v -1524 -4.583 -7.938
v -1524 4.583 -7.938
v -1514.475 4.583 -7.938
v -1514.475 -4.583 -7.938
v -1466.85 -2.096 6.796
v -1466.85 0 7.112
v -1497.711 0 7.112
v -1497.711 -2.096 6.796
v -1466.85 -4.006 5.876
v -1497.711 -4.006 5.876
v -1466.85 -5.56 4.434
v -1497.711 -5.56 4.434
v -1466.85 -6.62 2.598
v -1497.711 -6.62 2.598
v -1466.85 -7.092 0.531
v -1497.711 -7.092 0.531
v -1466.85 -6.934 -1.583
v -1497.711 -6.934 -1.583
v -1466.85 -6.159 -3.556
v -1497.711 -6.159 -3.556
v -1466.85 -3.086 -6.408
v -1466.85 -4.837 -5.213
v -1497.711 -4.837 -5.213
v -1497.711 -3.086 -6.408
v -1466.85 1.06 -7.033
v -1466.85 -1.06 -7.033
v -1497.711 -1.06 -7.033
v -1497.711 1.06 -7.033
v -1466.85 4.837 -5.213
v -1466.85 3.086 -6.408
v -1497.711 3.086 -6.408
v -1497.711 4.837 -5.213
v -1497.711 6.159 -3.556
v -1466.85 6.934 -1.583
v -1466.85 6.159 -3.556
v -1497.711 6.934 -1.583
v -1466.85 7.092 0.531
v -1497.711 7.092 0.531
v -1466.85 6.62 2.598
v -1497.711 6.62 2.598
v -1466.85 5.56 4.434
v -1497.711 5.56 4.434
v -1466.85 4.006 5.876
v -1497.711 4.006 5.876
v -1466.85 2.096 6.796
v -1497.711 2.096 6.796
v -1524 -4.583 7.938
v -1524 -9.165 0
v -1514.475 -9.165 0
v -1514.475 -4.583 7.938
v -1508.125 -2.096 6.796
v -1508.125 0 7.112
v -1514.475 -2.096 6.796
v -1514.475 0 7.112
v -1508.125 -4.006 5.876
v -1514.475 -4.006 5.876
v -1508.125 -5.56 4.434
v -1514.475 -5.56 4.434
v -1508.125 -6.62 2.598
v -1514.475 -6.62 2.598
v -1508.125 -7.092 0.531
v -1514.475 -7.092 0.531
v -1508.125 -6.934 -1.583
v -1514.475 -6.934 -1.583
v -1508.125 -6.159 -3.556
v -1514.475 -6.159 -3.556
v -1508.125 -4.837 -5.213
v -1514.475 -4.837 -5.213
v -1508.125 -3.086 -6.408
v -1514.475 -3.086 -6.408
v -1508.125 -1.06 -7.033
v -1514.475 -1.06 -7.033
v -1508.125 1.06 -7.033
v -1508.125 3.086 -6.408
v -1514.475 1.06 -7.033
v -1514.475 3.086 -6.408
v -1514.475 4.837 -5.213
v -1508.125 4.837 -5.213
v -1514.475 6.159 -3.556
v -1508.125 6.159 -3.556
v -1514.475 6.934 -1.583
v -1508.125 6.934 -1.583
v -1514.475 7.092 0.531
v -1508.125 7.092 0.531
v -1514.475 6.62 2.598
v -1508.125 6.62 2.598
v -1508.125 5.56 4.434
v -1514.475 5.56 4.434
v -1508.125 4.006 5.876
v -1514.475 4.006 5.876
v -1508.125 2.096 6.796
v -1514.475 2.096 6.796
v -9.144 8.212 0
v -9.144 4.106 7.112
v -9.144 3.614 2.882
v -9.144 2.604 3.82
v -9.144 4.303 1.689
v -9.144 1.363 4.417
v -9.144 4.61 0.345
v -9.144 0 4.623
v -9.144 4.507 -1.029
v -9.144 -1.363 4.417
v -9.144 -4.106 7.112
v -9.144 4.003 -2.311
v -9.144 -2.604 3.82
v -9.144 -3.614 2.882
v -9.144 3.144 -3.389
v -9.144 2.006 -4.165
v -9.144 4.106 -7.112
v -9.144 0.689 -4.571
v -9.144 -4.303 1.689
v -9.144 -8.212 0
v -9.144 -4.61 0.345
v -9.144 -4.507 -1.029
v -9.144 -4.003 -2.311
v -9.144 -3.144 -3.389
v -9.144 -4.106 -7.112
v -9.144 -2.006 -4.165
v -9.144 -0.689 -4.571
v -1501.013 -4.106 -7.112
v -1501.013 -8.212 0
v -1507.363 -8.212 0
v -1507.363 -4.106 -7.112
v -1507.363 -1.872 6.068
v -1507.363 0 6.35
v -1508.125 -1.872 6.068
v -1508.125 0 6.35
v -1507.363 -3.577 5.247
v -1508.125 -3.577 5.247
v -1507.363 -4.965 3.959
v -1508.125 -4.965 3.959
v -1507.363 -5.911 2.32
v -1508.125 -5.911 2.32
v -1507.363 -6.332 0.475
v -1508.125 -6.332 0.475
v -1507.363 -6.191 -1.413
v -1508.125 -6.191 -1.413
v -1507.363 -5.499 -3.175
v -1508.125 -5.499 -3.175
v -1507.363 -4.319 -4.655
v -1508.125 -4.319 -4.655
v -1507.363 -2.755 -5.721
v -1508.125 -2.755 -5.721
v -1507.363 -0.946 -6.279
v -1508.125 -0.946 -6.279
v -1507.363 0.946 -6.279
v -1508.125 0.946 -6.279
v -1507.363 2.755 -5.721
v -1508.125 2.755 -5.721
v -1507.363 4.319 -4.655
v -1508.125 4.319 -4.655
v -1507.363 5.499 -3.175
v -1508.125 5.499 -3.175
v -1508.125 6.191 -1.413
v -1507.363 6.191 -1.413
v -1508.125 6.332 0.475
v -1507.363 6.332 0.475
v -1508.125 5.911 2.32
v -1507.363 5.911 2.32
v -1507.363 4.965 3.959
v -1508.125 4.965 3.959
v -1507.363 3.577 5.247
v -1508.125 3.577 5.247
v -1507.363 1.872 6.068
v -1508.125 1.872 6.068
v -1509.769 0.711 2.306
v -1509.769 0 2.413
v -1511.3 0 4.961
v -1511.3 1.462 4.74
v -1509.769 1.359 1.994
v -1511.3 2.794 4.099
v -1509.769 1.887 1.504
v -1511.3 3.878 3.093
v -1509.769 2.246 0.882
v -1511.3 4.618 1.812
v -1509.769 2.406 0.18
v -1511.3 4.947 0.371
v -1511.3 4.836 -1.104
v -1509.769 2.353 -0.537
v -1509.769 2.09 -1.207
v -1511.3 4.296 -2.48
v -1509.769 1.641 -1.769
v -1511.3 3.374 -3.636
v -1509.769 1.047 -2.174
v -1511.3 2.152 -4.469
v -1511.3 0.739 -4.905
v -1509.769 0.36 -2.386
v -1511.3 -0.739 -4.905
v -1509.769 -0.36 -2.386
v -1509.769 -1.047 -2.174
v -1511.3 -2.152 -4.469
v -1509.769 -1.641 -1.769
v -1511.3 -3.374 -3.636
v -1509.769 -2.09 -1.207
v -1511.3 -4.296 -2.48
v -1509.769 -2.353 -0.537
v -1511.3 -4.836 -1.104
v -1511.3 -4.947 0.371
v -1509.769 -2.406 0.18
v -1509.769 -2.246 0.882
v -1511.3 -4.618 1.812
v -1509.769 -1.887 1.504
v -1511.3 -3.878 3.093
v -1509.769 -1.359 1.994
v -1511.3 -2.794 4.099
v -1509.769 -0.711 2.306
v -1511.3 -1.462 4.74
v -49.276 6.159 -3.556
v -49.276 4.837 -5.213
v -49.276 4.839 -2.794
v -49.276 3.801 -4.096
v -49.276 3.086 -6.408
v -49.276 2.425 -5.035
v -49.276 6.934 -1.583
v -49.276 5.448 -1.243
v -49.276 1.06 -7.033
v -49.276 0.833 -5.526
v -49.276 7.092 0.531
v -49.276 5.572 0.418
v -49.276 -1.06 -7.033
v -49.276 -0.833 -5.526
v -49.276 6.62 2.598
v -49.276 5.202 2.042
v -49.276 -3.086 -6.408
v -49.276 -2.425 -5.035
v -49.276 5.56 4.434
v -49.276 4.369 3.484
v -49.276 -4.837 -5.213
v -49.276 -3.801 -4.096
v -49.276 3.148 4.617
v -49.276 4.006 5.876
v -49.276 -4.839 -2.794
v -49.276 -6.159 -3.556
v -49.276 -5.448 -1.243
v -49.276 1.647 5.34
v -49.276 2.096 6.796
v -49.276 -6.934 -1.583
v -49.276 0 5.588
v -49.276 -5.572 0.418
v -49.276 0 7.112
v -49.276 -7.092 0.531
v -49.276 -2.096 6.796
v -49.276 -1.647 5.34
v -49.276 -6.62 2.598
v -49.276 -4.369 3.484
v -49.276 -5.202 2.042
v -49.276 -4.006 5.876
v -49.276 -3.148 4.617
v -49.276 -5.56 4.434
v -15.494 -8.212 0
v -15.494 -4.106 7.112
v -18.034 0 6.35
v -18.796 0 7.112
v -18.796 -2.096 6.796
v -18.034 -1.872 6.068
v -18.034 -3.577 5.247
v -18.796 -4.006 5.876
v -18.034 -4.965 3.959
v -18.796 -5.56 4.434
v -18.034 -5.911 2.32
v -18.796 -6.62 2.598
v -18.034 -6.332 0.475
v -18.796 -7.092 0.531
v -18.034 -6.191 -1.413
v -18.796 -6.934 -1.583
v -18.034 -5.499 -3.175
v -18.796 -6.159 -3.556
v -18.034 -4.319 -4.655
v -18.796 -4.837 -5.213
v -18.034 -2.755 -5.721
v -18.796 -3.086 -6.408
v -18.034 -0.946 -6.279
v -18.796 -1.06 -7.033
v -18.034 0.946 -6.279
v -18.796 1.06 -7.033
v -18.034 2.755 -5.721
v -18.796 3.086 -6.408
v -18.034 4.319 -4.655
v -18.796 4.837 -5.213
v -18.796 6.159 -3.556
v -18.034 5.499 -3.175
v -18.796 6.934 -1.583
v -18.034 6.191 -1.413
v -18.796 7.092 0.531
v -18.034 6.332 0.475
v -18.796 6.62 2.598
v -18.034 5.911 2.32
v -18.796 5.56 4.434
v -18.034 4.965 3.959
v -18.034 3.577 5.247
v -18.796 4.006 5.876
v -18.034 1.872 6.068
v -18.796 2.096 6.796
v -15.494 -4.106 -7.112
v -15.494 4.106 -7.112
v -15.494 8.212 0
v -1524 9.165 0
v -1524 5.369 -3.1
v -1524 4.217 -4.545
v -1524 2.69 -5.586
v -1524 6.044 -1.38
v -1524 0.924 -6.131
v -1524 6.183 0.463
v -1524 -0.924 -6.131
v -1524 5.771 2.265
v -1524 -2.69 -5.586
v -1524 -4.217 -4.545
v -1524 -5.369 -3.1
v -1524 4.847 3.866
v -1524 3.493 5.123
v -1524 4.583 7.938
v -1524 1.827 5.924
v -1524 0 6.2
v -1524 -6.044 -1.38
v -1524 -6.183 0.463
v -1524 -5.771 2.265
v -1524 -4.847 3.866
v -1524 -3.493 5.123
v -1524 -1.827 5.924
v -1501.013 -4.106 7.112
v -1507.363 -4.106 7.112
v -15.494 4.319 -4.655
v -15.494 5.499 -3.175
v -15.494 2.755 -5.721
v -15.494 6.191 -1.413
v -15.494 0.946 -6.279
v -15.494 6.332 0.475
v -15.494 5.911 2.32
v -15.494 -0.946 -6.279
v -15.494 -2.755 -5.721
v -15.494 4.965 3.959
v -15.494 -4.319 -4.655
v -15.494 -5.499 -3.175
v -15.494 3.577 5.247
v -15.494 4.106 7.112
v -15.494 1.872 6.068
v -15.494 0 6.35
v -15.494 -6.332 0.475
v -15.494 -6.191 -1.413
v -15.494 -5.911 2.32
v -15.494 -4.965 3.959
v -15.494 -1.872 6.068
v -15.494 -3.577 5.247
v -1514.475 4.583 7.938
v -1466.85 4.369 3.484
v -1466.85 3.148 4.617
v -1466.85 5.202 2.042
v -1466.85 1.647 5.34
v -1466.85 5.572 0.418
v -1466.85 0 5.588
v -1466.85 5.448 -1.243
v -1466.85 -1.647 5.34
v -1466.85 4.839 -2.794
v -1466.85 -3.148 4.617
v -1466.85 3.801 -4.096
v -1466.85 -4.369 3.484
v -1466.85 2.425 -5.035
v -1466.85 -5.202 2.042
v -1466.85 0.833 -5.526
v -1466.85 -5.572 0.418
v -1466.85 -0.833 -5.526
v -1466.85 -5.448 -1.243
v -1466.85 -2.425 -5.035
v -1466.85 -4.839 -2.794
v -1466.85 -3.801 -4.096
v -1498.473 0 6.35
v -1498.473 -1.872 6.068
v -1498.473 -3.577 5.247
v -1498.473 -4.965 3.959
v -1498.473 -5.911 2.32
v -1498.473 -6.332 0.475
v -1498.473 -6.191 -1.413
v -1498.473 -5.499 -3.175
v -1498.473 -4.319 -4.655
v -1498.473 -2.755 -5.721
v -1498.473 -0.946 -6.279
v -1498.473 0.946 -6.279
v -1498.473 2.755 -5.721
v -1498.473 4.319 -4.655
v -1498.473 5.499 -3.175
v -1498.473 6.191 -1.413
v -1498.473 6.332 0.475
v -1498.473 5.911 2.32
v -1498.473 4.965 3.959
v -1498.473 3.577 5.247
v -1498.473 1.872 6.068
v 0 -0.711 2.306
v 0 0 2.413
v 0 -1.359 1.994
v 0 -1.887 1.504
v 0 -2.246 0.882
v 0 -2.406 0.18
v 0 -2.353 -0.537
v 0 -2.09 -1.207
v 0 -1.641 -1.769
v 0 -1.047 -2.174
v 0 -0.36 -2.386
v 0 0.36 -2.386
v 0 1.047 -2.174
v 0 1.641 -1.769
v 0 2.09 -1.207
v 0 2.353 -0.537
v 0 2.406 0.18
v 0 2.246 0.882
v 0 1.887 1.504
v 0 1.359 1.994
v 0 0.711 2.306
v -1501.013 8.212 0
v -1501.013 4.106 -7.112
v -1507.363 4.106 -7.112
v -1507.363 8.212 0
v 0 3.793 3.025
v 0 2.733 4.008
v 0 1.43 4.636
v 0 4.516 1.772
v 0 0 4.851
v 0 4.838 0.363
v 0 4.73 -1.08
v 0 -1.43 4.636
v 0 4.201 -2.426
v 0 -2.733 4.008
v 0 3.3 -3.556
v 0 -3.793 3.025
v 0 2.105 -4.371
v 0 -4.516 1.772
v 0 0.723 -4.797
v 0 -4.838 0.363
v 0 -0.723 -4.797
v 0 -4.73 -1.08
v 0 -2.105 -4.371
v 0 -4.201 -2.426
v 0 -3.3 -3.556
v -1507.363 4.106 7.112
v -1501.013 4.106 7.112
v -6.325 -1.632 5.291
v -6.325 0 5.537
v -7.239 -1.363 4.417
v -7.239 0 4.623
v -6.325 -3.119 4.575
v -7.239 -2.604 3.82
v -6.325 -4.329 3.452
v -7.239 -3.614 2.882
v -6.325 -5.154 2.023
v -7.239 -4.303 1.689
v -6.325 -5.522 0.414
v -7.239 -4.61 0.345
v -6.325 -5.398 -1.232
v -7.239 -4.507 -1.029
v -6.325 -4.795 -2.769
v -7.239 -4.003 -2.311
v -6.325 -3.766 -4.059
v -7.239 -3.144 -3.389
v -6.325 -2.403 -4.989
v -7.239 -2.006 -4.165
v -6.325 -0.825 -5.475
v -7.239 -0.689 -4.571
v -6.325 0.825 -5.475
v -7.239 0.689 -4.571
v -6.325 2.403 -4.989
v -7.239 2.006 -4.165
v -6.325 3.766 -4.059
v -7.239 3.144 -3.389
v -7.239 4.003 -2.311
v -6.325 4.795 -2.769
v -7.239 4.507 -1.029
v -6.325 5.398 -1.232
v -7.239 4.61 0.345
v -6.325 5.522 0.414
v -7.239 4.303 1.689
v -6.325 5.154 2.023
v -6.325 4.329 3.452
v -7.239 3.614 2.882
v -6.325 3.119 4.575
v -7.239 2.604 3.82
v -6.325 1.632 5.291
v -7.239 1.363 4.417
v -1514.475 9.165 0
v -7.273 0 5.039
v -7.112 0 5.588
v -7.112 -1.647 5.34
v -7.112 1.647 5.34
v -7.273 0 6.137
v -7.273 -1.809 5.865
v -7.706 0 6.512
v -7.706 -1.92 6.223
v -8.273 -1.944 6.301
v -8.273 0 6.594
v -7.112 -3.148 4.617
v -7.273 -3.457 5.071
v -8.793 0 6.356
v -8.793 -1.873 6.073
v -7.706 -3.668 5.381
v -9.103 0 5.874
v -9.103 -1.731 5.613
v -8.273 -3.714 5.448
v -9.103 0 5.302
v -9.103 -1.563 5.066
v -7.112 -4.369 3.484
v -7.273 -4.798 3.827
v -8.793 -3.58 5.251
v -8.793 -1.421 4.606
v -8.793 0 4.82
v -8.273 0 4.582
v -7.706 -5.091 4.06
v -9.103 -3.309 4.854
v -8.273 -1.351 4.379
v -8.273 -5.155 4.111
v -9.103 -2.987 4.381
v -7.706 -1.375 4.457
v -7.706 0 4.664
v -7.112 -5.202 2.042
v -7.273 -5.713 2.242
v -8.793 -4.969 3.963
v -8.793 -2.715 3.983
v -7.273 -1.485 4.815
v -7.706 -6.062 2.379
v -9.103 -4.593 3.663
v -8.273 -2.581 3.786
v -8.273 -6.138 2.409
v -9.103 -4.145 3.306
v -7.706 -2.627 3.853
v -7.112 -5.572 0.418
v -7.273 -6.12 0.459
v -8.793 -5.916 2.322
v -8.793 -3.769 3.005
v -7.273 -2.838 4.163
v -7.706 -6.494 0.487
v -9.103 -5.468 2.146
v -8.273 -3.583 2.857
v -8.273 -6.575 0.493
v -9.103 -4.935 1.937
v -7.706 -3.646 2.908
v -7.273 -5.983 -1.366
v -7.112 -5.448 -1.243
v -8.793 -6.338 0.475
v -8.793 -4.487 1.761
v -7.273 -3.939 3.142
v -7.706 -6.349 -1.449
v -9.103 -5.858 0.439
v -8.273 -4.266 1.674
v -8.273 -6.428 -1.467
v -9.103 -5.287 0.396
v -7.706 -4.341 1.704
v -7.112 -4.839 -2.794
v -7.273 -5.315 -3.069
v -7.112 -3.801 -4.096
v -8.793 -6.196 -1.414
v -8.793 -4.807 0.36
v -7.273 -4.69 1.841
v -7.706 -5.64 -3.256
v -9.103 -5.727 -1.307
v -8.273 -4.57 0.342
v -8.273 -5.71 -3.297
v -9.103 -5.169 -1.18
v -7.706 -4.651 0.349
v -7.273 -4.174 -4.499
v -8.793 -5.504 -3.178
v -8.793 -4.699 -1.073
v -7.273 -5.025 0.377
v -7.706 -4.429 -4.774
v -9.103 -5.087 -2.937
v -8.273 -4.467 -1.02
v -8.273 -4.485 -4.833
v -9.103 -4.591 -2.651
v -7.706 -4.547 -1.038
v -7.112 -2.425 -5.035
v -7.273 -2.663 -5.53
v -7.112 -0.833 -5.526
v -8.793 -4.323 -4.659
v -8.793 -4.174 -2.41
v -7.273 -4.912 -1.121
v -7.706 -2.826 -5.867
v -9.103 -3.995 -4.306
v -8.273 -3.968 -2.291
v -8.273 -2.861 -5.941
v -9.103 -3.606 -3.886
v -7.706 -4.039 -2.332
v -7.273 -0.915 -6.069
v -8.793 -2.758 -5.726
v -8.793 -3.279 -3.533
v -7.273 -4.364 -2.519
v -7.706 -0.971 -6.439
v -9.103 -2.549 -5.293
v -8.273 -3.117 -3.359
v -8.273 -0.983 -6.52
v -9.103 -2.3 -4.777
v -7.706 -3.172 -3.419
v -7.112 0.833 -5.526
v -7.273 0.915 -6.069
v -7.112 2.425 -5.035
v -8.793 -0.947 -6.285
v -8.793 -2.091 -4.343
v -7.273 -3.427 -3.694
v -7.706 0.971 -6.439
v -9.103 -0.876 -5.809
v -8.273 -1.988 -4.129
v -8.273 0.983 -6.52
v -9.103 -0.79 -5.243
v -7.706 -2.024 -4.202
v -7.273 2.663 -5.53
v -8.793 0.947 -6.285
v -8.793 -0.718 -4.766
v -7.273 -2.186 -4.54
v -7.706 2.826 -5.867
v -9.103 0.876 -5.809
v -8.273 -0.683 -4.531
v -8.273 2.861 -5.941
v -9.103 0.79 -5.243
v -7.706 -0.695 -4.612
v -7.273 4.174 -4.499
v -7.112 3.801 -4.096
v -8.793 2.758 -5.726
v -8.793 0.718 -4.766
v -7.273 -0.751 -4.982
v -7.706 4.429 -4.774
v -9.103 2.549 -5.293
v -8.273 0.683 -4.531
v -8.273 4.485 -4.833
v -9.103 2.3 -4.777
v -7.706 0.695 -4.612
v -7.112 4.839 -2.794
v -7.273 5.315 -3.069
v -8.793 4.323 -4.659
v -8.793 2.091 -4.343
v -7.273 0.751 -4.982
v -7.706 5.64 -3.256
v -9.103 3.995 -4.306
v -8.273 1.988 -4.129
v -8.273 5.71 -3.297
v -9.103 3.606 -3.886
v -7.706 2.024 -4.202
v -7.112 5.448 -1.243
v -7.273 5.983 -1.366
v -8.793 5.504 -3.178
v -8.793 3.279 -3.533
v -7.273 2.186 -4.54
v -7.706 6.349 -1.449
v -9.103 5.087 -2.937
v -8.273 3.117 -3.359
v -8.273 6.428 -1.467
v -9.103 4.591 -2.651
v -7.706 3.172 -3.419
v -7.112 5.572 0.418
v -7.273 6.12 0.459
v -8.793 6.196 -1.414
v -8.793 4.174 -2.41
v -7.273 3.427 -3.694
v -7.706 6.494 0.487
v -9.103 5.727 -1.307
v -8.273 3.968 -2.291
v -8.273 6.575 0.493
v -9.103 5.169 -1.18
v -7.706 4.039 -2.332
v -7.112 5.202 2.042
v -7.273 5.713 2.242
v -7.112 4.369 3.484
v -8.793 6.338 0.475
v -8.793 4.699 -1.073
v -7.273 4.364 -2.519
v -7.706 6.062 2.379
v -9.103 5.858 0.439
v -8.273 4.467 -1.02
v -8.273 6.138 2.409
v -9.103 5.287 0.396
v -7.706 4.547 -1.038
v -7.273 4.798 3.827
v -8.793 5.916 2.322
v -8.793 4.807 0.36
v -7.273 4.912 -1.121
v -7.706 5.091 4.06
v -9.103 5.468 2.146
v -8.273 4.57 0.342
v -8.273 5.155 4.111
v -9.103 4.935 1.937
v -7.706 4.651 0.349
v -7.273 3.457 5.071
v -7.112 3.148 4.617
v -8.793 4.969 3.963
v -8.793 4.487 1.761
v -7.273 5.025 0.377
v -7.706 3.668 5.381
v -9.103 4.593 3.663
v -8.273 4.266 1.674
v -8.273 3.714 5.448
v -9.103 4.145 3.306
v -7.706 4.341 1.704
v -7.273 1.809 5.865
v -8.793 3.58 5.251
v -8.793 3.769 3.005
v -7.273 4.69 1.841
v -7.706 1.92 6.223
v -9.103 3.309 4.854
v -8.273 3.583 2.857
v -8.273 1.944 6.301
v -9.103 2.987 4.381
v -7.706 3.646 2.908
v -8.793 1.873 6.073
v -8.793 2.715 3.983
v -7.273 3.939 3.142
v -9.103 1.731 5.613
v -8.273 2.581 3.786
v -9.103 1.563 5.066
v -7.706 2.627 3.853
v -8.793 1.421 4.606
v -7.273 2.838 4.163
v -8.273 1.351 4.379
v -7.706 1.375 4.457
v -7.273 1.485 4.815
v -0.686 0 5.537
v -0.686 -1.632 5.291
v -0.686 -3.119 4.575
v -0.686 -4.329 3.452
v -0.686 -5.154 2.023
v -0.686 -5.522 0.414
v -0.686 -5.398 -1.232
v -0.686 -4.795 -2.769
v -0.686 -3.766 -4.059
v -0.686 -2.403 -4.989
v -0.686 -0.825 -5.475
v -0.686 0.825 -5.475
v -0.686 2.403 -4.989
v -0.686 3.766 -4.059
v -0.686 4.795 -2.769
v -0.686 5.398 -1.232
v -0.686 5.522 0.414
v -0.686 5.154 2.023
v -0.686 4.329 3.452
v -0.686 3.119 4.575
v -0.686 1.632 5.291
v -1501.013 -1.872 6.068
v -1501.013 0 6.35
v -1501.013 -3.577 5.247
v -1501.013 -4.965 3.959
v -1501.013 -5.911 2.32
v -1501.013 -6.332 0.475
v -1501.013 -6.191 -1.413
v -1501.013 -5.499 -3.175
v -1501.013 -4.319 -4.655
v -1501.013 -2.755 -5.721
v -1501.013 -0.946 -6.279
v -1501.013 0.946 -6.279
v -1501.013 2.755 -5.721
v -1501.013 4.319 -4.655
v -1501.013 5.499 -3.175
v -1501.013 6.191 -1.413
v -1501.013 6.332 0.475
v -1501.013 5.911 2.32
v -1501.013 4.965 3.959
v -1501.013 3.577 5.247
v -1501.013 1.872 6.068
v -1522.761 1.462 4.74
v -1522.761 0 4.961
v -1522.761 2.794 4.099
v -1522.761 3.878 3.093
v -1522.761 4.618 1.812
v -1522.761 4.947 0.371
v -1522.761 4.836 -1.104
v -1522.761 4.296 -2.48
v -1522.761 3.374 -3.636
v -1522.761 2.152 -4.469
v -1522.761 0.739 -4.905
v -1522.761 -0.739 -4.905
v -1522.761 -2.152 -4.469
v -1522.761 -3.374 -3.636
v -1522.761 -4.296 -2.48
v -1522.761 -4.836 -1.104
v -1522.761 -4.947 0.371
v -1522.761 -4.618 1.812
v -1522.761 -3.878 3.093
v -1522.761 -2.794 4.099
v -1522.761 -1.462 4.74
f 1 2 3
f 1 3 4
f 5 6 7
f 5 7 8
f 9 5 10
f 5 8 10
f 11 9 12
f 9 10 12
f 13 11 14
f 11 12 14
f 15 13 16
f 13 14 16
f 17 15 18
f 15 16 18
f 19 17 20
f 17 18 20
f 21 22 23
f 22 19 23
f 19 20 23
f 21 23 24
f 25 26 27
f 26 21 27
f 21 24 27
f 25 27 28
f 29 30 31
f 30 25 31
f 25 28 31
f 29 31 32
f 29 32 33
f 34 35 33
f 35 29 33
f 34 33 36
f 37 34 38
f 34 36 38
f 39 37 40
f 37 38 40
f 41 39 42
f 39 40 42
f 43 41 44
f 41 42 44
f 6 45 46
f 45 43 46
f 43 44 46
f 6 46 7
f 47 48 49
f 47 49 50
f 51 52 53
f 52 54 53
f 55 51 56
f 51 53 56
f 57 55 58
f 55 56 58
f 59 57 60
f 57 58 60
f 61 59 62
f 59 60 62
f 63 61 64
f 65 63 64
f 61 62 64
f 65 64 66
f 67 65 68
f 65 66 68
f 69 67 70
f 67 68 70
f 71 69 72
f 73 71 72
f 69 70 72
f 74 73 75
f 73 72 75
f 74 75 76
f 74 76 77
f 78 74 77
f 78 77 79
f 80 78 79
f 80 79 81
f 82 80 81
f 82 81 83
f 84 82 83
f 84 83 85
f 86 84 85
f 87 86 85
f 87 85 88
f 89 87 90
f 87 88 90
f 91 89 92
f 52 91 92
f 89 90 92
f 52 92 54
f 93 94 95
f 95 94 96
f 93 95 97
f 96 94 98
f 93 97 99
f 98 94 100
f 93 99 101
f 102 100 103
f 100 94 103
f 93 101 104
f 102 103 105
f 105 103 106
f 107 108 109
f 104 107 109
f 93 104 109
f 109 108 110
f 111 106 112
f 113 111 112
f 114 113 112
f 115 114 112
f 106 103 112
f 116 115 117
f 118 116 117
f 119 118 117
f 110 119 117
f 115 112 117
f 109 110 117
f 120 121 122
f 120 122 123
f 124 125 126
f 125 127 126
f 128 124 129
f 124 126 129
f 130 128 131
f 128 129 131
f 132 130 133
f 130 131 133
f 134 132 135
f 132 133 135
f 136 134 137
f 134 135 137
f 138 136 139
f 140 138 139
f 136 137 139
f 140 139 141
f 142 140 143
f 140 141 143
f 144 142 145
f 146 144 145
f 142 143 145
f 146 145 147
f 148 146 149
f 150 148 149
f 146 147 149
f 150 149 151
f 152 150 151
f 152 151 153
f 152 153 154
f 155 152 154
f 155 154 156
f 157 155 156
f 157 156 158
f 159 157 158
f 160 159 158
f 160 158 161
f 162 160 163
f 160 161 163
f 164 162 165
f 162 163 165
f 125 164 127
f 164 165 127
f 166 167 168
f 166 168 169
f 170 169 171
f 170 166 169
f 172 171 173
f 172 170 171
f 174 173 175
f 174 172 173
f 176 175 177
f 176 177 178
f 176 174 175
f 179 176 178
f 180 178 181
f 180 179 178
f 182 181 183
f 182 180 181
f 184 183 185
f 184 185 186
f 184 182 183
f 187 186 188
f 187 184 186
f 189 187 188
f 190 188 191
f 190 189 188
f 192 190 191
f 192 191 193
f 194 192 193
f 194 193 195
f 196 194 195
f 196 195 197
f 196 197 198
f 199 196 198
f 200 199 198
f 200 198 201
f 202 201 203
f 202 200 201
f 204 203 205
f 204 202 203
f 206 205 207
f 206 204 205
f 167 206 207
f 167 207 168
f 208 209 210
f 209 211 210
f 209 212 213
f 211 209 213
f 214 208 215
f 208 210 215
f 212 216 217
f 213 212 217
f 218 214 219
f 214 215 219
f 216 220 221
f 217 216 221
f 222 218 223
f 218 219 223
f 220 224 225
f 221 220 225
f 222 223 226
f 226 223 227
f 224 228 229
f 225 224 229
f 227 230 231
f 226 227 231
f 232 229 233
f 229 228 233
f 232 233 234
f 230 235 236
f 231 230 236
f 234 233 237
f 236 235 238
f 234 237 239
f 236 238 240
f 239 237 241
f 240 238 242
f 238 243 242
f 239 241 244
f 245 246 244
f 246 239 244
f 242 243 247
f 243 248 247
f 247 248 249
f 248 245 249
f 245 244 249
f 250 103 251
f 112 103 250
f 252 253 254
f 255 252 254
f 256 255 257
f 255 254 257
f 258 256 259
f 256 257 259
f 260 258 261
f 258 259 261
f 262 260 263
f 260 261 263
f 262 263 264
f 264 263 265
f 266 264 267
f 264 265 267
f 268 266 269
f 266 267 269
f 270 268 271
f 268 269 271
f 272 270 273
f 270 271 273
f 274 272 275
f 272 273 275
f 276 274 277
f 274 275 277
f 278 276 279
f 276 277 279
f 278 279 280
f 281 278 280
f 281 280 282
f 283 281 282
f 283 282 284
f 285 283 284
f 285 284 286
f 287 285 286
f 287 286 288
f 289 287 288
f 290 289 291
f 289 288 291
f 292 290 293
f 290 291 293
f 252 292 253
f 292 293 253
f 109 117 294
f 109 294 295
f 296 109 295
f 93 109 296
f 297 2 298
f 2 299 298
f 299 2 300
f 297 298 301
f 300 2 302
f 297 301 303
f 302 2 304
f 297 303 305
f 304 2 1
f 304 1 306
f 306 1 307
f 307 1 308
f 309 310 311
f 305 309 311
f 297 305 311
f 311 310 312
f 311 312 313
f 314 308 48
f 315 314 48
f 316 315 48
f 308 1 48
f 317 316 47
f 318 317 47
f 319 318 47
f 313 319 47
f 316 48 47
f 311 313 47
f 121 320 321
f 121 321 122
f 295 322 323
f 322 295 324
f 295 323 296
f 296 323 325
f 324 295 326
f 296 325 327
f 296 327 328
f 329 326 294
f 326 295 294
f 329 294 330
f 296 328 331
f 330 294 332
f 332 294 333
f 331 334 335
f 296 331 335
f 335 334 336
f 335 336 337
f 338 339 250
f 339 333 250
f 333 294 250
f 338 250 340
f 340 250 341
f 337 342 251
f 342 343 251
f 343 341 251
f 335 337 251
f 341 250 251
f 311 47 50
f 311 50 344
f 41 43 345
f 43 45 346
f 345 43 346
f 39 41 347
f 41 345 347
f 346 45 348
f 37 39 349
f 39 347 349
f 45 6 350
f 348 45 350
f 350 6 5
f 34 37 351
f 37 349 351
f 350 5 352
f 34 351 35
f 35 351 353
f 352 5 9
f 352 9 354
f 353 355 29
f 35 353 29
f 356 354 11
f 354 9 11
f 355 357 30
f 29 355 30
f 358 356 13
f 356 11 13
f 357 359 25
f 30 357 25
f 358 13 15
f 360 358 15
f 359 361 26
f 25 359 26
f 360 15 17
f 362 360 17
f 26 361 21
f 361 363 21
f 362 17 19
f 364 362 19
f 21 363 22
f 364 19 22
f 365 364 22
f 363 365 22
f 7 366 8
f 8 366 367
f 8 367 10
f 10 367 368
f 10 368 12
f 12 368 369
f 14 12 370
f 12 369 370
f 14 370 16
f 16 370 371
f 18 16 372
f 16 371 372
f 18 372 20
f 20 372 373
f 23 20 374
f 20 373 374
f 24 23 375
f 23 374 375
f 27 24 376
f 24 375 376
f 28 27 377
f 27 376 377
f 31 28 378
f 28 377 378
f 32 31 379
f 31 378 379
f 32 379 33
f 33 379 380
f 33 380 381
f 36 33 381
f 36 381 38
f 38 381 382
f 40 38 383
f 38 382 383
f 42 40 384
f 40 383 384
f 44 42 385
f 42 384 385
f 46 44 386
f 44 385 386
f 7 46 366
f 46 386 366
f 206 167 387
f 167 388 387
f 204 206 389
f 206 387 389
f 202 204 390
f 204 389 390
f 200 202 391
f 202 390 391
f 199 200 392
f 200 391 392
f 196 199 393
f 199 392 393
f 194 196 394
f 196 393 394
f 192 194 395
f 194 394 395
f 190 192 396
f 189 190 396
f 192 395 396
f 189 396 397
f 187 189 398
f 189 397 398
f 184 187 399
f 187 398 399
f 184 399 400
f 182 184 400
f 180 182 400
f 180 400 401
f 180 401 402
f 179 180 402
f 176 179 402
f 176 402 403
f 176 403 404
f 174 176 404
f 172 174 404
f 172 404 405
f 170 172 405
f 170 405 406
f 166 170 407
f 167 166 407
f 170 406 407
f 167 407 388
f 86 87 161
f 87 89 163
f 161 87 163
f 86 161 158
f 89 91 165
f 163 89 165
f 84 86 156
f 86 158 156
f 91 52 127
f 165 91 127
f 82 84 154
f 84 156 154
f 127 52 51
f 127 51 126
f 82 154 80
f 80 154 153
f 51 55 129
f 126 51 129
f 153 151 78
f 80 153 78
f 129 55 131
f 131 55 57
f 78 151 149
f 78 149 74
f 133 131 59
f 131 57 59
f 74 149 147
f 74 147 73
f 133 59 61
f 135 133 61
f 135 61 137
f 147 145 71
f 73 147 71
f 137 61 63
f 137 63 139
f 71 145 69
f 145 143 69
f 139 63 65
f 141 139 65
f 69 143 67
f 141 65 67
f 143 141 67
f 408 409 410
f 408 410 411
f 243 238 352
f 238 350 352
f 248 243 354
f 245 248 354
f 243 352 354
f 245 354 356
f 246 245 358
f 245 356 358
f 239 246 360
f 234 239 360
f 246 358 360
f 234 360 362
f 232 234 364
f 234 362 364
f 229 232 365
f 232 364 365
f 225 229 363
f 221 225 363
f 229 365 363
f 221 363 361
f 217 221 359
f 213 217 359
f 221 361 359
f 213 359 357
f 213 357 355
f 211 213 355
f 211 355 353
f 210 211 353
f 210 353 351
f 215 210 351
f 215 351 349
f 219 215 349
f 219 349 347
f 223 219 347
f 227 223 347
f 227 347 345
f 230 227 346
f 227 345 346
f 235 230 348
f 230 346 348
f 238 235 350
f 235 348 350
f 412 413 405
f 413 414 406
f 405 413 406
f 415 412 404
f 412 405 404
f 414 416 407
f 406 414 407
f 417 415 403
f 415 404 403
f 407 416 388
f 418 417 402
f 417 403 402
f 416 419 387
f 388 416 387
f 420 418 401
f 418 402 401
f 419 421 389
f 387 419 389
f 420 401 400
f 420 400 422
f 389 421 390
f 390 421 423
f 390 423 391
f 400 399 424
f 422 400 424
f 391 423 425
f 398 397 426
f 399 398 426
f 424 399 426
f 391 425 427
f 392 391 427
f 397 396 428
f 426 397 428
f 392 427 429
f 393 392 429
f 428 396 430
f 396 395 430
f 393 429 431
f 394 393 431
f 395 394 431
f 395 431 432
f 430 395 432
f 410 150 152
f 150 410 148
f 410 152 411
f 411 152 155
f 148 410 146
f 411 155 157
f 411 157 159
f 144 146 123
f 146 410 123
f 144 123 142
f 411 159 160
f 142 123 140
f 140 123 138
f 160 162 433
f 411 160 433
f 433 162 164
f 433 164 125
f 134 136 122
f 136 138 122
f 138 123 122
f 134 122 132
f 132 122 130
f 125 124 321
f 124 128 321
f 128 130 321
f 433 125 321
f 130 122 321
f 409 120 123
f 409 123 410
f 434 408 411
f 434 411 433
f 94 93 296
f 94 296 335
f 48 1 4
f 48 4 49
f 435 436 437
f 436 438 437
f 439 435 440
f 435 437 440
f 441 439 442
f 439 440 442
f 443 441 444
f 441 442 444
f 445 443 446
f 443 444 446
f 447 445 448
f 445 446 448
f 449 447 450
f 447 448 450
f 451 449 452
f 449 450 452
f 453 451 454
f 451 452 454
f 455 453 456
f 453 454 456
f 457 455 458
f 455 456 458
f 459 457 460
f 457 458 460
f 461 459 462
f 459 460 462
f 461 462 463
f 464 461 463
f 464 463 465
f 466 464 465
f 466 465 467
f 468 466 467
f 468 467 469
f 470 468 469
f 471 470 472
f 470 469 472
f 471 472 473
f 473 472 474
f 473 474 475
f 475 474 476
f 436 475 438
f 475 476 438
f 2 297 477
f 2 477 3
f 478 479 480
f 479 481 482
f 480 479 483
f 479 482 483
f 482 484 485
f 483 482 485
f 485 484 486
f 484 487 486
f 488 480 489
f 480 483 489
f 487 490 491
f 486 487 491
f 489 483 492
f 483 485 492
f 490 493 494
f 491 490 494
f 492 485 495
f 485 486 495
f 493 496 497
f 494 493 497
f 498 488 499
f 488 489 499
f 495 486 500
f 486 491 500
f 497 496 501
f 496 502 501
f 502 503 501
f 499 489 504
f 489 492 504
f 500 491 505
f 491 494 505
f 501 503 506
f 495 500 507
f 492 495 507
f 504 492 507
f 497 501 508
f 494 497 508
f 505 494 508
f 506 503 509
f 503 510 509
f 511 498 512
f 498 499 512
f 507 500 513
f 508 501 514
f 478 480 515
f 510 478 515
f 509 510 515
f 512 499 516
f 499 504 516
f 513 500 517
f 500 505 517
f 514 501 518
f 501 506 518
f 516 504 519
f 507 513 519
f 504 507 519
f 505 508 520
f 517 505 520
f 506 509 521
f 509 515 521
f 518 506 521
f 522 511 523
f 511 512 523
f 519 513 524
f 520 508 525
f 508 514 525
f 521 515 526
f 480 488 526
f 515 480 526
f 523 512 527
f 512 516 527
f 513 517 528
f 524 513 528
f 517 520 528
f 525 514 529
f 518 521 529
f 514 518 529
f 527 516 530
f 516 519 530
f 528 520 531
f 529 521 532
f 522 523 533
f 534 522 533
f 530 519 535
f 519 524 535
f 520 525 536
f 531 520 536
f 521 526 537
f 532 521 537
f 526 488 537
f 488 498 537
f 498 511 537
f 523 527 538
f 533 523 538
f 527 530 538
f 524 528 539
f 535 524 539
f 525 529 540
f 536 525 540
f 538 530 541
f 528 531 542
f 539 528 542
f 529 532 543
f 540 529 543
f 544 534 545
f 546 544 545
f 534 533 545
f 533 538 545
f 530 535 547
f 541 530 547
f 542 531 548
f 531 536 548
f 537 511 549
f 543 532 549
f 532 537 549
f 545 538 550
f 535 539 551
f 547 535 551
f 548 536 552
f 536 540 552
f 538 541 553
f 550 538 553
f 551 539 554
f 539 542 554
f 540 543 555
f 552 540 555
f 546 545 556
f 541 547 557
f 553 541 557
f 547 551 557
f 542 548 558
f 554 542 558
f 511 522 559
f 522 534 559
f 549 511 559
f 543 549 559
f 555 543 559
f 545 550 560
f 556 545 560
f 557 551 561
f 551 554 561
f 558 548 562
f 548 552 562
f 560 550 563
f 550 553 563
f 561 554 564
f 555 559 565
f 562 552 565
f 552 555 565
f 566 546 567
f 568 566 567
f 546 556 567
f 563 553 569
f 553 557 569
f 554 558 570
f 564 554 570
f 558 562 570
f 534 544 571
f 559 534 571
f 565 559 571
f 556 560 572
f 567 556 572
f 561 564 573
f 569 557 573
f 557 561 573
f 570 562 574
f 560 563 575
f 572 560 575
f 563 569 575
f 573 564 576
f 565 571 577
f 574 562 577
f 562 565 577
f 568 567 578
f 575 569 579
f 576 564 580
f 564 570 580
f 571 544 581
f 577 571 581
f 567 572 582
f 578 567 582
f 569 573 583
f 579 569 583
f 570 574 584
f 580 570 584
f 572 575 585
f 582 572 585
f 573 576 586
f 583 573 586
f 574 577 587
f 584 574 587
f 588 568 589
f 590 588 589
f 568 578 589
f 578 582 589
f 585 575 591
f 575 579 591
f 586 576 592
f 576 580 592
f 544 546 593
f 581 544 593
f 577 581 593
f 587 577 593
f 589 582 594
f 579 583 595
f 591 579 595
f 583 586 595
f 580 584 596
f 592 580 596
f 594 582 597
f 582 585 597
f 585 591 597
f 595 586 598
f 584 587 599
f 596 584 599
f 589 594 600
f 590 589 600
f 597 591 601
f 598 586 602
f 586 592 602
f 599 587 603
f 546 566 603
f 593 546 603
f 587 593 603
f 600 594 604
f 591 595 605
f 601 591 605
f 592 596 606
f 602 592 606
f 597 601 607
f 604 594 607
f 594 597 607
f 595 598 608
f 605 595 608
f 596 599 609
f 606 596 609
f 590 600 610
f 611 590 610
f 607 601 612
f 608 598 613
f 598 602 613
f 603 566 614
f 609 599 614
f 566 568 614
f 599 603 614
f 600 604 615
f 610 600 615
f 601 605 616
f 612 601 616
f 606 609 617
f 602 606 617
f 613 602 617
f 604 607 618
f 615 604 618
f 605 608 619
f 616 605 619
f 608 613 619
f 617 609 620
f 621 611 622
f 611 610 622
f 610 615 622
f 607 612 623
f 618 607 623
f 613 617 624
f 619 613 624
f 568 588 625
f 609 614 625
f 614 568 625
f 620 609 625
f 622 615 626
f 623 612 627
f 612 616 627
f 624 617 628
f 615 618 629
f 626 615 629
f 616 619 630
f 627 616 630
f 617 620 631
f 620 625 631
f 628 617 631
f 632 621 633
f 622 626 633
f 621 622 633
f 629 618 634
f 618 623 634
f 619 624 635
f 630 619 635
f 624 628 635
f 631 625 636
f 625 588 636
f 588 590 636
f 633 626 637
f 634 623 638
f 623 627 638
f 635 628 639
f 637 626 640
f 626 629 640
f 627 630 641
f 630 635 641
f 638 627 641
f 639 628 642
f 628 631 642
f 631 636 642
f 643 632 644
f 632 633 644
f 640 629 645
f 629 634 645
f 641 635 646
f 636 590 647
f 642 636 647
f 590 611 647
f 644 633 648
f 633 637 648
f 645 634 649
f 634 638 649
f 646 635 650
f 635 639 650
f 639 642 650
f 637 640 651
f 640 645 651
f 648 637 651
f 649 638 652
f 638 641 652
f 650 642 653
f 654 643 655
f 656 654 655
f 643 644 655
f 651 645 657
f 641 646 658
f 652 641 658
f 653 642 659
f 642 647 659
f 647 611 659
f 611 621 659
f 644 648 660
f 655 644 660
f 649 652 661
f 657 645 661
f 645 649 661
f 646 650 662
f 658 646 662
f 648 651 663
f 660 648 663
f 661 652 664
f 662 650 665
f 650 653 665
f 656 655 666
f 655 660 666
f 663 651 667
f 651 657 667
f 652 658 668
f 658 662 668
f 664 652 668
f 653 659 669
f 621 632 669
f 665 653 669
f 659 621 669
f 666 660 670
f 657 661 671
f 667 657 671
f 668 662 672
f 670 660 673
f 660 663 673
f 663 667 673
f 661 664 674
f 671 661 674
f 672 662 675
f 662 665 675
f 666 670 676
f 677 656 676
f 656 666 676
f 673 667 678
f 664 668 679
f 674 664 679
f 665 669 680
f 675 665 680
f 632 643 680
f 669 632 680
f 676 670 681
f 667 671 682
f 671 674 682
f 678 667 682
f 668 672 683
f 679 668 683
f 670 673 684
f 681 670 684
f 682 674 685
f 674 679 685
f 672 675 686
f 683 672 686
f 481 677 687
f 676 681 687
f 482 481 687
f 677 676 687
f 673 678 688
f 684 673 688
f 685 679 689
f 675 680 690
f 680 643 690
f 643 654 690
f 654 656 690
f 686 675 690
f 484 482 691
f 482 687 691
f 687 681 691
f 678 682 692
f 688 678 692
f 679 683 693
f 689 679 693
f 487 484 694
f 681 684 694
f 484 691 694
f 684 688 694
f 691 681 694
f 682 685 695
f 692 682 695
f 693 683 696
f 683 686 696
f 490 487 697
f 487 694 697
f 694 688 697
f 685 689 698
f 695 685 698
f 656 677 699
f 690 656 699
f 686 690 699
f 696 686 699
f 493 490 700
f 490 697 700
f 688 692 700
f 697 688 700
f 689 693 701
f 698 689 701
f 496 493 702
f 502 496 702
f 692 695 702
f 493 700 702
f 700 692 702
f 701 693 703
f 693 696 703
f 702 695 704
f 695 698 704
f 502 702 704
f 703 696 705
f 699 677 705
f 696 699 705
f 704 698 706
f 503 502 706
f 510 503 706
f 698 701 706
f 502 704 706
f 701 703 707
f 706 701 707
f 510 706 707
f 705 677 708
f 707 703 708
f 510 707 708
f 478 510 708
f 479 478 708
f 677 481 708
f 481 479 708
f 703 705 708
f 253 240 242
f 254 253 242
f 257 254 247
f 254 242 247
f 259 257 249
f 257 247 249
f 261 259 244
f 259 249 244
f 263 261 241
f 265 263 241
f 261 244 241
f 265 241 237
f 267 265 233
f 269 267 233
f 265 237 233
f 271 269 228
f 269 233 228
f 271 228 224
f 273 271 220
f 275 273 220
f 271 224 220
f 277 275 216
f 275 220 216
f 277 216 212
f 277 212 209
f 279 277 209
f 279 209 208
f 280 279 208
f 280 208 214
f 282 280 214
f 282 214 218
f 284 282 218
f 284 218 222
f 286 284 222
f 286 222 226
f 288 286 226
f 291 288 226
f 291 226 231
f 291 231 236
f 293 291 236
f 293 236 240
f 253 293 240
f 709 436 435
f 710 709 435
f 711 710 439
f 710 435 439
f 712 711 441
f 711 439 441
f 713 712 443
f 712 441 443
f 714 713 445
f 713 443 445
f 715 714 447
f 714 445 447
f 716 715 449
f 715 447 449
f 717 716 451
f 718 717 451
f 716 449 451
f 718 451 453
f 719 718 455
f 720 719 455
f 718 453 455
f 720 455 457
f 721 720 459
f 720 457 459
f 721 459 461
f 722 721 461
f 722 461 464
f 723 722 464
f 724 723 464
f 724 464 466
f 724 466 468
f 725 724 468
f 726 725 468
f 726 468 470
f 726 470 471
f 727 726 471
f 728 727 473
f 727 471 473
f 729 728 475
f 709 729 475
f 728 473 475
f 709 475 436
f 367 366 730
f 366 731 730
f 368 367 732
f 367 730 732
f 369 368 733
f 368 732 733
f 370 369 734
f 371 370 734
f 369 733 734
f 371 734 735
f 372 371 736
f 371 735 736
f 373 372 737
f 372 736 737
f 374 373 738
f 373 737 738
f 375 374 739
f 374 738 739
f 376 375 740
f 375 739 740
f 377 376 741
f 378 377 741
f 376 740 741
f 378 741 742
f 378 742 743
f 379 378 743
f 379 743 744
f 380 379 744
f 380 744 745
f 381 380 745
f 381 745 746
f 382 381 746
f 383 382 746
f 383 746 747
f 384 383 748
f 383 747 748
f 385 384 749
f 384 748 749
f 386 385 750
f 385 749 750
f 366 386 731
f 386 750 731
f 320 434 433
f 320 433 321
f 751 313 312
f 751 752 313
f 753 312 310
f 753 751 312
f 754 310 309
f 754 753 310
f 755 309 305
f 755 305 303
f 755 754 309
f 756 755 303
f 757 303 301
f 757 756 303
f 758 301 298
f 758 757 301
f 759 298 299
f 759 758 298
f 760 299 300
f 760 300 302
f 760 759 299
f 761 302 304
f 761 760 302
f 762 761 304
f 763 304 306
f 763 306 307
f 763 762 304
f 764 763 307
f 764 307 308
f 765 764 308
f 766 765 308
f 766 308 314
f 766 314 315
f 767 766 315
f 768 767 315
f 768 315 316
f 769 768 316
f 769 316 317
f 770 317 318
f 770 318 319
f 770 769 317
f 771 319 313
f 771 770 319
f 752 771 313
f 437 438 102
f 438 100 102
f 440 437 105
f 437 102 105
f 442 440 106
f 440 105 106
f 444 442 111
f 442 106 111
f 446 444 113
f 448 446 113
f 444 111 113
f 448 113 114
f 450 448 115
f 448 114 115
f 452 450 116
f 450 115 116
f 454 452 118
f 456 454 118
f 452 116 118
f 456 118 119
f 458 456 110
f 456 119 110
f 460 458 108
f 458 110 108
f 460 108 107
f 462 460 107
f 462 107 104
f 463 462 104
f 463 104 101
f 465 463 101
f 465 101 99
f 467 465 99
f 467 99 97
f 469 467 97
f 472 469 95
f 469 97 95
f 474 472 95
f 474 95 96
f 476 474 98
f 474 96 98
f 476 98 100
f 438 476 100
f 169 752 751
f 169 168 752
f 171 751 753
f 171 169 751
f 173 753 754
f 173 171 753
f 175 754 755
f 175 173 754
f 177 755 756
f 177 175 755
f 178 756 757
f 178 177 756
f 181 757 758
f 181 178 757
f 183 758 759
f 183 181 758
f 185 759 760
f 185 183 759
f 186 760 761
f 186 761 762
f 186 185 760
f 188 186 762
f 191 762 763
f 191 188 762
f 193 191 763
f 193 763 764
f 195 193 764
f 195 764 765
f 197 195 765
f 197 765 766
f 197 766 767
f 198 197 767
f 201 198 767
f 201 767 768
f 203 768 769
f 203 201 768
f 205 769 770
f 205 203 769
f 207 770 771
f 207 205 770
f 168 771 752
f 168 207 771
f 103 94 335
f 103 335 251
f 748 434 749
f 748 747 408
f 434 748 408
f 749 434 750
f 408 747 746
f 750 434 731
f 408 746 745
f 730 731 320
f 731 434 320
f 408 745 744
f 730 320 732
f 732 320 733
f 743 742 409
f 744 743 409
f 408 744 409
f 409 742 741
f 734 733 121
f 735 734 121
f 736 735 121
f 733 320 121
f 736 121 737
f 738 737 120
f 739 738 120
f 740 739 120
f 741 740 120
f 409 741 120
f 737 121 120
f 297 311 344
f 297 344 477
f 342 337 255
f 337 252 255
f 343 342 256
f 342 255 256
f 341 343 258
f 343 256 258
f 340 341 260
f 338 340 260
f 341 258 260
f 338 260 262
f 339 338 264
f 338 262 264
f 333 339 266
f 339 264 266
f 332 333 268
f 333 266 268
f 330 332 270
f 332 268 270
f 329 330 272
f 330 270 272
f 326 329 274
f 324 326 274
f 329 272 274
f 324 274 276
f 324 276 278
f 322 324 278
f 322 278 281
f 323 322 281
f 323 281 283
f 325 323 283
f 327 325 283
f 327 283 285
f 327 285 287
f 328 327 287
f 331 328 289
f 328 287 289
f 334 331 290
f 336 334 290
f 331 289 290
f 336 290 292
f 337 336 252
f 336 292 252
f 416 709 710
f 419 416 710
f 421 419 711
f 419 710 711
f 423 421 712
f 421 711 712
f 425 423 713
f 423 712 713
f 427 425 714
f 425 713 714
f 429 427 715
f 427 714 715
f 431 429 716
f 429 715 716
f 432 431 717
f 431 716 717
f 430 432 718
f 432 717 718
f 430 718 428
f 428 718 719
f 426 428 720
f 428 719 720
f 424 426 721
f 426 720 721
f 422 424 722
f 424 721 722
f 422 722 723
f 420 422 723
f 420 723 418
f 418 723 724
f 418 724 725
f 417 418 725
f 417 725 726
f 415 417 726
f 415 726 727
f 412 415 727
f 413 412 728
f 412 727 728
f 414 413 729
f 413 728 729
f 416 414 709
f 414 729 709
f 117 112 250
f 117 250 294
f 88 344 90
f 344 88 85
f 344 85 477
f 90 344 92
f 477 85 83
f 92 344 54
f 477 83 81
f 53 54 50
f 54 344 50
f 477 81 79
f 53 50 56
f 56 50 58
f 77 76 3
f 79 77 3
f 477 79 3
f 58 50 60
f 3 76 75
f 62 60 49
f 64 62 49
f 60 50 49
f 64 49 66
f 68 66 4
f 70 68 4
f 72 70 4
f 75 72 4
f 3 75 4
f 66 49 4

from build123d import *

# Parameters (mm, degrees)
SKETCH2_R          = 19.05
CUT_EXTRUDE1_DEPTH = 1498.219
CUT_EXTRUDE2_REACH = 1526
SKETCH3_R          = 19.05
CHAMFER1_SIZE      = 0.6858
SKETCH4_R          = 1.016


with BuildPart() as part:
    # Sketch1 → Revolve1 (revolve)
    with BuildSketch(Plane.XY, mode=Mode.PRIVATE) as revolve1_sk:
        Polygon((-1524, 2.413), (0, 2.413), (0, 5.5372), (-6.3246, 5.5372), (-7.239, 4.6228), (-9.144, 4.6228), (-9.144, 19.05), (-15.494, 19.05), (-15.494, 6.35), (-18.034, 6.35), (-18.796, 7.112), (-49.276, 7.112), (-49.276, 5.588), (-1466.85, 5.588), (-1466.85, 7.112), (-1497.711, 7.112), (-1498.473, 6.35), (-1501.013, 6.35), (-1501.013, 19.05), (-1507.363, 19.05), (-1507.363, 6.35), (-1508.125, 6.35), (-1508.125, 7.112), (-1514.475, 7.112), (-1514.475, 19.05), (-1524, 19.05), align=None)
    revolve(revolve1_sk.sketch.rotate(Axis((0, 0, 0), (1, 0, 0)), 90), axis=Axis((0, 0, 0), (1, 0, 0)))  # turned: the seam where the file's is

    # Sketch2 → Cut-Extrude1 (cut)
    with BuildSketch(Plane(origin=(-9.144, 0, 0), x_dir=(0, 0, -1), z_dir=(1, 0, 0))):
        with Locations(Location((0, 0, 0), (0, 0, 180))):  # turned: the seam where the file's is
            Circle(SKETCH2_R)
        Polygon((0, 8.212230229), (-7.112, 4.106115114), (-7.112, -4.106115114), (0, -8.212230229), (7.112, -4.106115114), (7.112, 4.106115114), align=None, mode=Mode.SUBTRACT)
    extrude(amount=-CUT_EXTRUDE1_DEPTH, mode=Mode.SUBTRACT)

    # Sketch3 → Cut-Extrude2 (cut, up to next)
    with BuildSketch(Plane.ZY.offset(1524), mode=Mode.PRIVATE) as cut_extrude2_sk1:
        Circle(SKETCH3_R)
        Polygon((0, 9.165435523), (-7.9375, 4.582717762), (-7.9375, -4.582717762), (0, -9.165435523), (7.9375, -4.582717762), (7.9375, 4.582717762), align=None, mode=Mode.SUBTRACT)
    cut_extrude2_tool1 = extrude(cut_extrude2_sk1.sketch, amount=-CUT_EXTRUDE2_REACH, mode=Mode.PRIVATE) & part.part
    add(cut_extrude2_tool1.solids().sort_by_distance((-1524, 0, -18.511185))[0], mode=Mode.SUBTRACT)

    # Chamfer1
    chamfer1_edges = [part.edges().sort_by_distance(p)[0] for p in [
        (0, 0, -5.5372),
    ]]
    chamfer(chamfer1_edges, length=CHAMFER1_SIZE)

    # Sketch5 → Cut-Revolve2 (revolve, cut)
    with BuildSketch(Plane.XY, mode=Mode.PRIVATE) as cut_revolve2_sk:
        Polygon((-1524, 6.199895345), (-1522.760724655, 4.96062), (-1511.3, 4.96062), (-1508.319358796, 0), (-1524, 0), align=None)
    revolve(cut_revolve2_sk.sketch.rotate(Axis((-576.489826751, 0, 0), (-1, 0, 0)), 270), axis=Axis((-576.489826751, 0, 0), (-1, 0, 0)), mode=Mode.SUBTRACT)  # turned: the seam where the file's is


with BuildPart() as body_2:
    # Sketch4 → Revolve5 (revolve)
    with BuildSketch(Plane.XY, mode=Mode.PRIVATE) as revolve5_sk:
        with Locations((-8.128, 5.588)):
            Circle(SKETCH4_R)
    revolve(revolve5_sk.sketch.rotate(Axis((0, 0, 0), (1, 0, 0)), 90), axis=Axis((0, 0, 0), (1, 0, 0)))  # turned: the seam where the file's is


solid = Compound([part.part, body_2.part])
